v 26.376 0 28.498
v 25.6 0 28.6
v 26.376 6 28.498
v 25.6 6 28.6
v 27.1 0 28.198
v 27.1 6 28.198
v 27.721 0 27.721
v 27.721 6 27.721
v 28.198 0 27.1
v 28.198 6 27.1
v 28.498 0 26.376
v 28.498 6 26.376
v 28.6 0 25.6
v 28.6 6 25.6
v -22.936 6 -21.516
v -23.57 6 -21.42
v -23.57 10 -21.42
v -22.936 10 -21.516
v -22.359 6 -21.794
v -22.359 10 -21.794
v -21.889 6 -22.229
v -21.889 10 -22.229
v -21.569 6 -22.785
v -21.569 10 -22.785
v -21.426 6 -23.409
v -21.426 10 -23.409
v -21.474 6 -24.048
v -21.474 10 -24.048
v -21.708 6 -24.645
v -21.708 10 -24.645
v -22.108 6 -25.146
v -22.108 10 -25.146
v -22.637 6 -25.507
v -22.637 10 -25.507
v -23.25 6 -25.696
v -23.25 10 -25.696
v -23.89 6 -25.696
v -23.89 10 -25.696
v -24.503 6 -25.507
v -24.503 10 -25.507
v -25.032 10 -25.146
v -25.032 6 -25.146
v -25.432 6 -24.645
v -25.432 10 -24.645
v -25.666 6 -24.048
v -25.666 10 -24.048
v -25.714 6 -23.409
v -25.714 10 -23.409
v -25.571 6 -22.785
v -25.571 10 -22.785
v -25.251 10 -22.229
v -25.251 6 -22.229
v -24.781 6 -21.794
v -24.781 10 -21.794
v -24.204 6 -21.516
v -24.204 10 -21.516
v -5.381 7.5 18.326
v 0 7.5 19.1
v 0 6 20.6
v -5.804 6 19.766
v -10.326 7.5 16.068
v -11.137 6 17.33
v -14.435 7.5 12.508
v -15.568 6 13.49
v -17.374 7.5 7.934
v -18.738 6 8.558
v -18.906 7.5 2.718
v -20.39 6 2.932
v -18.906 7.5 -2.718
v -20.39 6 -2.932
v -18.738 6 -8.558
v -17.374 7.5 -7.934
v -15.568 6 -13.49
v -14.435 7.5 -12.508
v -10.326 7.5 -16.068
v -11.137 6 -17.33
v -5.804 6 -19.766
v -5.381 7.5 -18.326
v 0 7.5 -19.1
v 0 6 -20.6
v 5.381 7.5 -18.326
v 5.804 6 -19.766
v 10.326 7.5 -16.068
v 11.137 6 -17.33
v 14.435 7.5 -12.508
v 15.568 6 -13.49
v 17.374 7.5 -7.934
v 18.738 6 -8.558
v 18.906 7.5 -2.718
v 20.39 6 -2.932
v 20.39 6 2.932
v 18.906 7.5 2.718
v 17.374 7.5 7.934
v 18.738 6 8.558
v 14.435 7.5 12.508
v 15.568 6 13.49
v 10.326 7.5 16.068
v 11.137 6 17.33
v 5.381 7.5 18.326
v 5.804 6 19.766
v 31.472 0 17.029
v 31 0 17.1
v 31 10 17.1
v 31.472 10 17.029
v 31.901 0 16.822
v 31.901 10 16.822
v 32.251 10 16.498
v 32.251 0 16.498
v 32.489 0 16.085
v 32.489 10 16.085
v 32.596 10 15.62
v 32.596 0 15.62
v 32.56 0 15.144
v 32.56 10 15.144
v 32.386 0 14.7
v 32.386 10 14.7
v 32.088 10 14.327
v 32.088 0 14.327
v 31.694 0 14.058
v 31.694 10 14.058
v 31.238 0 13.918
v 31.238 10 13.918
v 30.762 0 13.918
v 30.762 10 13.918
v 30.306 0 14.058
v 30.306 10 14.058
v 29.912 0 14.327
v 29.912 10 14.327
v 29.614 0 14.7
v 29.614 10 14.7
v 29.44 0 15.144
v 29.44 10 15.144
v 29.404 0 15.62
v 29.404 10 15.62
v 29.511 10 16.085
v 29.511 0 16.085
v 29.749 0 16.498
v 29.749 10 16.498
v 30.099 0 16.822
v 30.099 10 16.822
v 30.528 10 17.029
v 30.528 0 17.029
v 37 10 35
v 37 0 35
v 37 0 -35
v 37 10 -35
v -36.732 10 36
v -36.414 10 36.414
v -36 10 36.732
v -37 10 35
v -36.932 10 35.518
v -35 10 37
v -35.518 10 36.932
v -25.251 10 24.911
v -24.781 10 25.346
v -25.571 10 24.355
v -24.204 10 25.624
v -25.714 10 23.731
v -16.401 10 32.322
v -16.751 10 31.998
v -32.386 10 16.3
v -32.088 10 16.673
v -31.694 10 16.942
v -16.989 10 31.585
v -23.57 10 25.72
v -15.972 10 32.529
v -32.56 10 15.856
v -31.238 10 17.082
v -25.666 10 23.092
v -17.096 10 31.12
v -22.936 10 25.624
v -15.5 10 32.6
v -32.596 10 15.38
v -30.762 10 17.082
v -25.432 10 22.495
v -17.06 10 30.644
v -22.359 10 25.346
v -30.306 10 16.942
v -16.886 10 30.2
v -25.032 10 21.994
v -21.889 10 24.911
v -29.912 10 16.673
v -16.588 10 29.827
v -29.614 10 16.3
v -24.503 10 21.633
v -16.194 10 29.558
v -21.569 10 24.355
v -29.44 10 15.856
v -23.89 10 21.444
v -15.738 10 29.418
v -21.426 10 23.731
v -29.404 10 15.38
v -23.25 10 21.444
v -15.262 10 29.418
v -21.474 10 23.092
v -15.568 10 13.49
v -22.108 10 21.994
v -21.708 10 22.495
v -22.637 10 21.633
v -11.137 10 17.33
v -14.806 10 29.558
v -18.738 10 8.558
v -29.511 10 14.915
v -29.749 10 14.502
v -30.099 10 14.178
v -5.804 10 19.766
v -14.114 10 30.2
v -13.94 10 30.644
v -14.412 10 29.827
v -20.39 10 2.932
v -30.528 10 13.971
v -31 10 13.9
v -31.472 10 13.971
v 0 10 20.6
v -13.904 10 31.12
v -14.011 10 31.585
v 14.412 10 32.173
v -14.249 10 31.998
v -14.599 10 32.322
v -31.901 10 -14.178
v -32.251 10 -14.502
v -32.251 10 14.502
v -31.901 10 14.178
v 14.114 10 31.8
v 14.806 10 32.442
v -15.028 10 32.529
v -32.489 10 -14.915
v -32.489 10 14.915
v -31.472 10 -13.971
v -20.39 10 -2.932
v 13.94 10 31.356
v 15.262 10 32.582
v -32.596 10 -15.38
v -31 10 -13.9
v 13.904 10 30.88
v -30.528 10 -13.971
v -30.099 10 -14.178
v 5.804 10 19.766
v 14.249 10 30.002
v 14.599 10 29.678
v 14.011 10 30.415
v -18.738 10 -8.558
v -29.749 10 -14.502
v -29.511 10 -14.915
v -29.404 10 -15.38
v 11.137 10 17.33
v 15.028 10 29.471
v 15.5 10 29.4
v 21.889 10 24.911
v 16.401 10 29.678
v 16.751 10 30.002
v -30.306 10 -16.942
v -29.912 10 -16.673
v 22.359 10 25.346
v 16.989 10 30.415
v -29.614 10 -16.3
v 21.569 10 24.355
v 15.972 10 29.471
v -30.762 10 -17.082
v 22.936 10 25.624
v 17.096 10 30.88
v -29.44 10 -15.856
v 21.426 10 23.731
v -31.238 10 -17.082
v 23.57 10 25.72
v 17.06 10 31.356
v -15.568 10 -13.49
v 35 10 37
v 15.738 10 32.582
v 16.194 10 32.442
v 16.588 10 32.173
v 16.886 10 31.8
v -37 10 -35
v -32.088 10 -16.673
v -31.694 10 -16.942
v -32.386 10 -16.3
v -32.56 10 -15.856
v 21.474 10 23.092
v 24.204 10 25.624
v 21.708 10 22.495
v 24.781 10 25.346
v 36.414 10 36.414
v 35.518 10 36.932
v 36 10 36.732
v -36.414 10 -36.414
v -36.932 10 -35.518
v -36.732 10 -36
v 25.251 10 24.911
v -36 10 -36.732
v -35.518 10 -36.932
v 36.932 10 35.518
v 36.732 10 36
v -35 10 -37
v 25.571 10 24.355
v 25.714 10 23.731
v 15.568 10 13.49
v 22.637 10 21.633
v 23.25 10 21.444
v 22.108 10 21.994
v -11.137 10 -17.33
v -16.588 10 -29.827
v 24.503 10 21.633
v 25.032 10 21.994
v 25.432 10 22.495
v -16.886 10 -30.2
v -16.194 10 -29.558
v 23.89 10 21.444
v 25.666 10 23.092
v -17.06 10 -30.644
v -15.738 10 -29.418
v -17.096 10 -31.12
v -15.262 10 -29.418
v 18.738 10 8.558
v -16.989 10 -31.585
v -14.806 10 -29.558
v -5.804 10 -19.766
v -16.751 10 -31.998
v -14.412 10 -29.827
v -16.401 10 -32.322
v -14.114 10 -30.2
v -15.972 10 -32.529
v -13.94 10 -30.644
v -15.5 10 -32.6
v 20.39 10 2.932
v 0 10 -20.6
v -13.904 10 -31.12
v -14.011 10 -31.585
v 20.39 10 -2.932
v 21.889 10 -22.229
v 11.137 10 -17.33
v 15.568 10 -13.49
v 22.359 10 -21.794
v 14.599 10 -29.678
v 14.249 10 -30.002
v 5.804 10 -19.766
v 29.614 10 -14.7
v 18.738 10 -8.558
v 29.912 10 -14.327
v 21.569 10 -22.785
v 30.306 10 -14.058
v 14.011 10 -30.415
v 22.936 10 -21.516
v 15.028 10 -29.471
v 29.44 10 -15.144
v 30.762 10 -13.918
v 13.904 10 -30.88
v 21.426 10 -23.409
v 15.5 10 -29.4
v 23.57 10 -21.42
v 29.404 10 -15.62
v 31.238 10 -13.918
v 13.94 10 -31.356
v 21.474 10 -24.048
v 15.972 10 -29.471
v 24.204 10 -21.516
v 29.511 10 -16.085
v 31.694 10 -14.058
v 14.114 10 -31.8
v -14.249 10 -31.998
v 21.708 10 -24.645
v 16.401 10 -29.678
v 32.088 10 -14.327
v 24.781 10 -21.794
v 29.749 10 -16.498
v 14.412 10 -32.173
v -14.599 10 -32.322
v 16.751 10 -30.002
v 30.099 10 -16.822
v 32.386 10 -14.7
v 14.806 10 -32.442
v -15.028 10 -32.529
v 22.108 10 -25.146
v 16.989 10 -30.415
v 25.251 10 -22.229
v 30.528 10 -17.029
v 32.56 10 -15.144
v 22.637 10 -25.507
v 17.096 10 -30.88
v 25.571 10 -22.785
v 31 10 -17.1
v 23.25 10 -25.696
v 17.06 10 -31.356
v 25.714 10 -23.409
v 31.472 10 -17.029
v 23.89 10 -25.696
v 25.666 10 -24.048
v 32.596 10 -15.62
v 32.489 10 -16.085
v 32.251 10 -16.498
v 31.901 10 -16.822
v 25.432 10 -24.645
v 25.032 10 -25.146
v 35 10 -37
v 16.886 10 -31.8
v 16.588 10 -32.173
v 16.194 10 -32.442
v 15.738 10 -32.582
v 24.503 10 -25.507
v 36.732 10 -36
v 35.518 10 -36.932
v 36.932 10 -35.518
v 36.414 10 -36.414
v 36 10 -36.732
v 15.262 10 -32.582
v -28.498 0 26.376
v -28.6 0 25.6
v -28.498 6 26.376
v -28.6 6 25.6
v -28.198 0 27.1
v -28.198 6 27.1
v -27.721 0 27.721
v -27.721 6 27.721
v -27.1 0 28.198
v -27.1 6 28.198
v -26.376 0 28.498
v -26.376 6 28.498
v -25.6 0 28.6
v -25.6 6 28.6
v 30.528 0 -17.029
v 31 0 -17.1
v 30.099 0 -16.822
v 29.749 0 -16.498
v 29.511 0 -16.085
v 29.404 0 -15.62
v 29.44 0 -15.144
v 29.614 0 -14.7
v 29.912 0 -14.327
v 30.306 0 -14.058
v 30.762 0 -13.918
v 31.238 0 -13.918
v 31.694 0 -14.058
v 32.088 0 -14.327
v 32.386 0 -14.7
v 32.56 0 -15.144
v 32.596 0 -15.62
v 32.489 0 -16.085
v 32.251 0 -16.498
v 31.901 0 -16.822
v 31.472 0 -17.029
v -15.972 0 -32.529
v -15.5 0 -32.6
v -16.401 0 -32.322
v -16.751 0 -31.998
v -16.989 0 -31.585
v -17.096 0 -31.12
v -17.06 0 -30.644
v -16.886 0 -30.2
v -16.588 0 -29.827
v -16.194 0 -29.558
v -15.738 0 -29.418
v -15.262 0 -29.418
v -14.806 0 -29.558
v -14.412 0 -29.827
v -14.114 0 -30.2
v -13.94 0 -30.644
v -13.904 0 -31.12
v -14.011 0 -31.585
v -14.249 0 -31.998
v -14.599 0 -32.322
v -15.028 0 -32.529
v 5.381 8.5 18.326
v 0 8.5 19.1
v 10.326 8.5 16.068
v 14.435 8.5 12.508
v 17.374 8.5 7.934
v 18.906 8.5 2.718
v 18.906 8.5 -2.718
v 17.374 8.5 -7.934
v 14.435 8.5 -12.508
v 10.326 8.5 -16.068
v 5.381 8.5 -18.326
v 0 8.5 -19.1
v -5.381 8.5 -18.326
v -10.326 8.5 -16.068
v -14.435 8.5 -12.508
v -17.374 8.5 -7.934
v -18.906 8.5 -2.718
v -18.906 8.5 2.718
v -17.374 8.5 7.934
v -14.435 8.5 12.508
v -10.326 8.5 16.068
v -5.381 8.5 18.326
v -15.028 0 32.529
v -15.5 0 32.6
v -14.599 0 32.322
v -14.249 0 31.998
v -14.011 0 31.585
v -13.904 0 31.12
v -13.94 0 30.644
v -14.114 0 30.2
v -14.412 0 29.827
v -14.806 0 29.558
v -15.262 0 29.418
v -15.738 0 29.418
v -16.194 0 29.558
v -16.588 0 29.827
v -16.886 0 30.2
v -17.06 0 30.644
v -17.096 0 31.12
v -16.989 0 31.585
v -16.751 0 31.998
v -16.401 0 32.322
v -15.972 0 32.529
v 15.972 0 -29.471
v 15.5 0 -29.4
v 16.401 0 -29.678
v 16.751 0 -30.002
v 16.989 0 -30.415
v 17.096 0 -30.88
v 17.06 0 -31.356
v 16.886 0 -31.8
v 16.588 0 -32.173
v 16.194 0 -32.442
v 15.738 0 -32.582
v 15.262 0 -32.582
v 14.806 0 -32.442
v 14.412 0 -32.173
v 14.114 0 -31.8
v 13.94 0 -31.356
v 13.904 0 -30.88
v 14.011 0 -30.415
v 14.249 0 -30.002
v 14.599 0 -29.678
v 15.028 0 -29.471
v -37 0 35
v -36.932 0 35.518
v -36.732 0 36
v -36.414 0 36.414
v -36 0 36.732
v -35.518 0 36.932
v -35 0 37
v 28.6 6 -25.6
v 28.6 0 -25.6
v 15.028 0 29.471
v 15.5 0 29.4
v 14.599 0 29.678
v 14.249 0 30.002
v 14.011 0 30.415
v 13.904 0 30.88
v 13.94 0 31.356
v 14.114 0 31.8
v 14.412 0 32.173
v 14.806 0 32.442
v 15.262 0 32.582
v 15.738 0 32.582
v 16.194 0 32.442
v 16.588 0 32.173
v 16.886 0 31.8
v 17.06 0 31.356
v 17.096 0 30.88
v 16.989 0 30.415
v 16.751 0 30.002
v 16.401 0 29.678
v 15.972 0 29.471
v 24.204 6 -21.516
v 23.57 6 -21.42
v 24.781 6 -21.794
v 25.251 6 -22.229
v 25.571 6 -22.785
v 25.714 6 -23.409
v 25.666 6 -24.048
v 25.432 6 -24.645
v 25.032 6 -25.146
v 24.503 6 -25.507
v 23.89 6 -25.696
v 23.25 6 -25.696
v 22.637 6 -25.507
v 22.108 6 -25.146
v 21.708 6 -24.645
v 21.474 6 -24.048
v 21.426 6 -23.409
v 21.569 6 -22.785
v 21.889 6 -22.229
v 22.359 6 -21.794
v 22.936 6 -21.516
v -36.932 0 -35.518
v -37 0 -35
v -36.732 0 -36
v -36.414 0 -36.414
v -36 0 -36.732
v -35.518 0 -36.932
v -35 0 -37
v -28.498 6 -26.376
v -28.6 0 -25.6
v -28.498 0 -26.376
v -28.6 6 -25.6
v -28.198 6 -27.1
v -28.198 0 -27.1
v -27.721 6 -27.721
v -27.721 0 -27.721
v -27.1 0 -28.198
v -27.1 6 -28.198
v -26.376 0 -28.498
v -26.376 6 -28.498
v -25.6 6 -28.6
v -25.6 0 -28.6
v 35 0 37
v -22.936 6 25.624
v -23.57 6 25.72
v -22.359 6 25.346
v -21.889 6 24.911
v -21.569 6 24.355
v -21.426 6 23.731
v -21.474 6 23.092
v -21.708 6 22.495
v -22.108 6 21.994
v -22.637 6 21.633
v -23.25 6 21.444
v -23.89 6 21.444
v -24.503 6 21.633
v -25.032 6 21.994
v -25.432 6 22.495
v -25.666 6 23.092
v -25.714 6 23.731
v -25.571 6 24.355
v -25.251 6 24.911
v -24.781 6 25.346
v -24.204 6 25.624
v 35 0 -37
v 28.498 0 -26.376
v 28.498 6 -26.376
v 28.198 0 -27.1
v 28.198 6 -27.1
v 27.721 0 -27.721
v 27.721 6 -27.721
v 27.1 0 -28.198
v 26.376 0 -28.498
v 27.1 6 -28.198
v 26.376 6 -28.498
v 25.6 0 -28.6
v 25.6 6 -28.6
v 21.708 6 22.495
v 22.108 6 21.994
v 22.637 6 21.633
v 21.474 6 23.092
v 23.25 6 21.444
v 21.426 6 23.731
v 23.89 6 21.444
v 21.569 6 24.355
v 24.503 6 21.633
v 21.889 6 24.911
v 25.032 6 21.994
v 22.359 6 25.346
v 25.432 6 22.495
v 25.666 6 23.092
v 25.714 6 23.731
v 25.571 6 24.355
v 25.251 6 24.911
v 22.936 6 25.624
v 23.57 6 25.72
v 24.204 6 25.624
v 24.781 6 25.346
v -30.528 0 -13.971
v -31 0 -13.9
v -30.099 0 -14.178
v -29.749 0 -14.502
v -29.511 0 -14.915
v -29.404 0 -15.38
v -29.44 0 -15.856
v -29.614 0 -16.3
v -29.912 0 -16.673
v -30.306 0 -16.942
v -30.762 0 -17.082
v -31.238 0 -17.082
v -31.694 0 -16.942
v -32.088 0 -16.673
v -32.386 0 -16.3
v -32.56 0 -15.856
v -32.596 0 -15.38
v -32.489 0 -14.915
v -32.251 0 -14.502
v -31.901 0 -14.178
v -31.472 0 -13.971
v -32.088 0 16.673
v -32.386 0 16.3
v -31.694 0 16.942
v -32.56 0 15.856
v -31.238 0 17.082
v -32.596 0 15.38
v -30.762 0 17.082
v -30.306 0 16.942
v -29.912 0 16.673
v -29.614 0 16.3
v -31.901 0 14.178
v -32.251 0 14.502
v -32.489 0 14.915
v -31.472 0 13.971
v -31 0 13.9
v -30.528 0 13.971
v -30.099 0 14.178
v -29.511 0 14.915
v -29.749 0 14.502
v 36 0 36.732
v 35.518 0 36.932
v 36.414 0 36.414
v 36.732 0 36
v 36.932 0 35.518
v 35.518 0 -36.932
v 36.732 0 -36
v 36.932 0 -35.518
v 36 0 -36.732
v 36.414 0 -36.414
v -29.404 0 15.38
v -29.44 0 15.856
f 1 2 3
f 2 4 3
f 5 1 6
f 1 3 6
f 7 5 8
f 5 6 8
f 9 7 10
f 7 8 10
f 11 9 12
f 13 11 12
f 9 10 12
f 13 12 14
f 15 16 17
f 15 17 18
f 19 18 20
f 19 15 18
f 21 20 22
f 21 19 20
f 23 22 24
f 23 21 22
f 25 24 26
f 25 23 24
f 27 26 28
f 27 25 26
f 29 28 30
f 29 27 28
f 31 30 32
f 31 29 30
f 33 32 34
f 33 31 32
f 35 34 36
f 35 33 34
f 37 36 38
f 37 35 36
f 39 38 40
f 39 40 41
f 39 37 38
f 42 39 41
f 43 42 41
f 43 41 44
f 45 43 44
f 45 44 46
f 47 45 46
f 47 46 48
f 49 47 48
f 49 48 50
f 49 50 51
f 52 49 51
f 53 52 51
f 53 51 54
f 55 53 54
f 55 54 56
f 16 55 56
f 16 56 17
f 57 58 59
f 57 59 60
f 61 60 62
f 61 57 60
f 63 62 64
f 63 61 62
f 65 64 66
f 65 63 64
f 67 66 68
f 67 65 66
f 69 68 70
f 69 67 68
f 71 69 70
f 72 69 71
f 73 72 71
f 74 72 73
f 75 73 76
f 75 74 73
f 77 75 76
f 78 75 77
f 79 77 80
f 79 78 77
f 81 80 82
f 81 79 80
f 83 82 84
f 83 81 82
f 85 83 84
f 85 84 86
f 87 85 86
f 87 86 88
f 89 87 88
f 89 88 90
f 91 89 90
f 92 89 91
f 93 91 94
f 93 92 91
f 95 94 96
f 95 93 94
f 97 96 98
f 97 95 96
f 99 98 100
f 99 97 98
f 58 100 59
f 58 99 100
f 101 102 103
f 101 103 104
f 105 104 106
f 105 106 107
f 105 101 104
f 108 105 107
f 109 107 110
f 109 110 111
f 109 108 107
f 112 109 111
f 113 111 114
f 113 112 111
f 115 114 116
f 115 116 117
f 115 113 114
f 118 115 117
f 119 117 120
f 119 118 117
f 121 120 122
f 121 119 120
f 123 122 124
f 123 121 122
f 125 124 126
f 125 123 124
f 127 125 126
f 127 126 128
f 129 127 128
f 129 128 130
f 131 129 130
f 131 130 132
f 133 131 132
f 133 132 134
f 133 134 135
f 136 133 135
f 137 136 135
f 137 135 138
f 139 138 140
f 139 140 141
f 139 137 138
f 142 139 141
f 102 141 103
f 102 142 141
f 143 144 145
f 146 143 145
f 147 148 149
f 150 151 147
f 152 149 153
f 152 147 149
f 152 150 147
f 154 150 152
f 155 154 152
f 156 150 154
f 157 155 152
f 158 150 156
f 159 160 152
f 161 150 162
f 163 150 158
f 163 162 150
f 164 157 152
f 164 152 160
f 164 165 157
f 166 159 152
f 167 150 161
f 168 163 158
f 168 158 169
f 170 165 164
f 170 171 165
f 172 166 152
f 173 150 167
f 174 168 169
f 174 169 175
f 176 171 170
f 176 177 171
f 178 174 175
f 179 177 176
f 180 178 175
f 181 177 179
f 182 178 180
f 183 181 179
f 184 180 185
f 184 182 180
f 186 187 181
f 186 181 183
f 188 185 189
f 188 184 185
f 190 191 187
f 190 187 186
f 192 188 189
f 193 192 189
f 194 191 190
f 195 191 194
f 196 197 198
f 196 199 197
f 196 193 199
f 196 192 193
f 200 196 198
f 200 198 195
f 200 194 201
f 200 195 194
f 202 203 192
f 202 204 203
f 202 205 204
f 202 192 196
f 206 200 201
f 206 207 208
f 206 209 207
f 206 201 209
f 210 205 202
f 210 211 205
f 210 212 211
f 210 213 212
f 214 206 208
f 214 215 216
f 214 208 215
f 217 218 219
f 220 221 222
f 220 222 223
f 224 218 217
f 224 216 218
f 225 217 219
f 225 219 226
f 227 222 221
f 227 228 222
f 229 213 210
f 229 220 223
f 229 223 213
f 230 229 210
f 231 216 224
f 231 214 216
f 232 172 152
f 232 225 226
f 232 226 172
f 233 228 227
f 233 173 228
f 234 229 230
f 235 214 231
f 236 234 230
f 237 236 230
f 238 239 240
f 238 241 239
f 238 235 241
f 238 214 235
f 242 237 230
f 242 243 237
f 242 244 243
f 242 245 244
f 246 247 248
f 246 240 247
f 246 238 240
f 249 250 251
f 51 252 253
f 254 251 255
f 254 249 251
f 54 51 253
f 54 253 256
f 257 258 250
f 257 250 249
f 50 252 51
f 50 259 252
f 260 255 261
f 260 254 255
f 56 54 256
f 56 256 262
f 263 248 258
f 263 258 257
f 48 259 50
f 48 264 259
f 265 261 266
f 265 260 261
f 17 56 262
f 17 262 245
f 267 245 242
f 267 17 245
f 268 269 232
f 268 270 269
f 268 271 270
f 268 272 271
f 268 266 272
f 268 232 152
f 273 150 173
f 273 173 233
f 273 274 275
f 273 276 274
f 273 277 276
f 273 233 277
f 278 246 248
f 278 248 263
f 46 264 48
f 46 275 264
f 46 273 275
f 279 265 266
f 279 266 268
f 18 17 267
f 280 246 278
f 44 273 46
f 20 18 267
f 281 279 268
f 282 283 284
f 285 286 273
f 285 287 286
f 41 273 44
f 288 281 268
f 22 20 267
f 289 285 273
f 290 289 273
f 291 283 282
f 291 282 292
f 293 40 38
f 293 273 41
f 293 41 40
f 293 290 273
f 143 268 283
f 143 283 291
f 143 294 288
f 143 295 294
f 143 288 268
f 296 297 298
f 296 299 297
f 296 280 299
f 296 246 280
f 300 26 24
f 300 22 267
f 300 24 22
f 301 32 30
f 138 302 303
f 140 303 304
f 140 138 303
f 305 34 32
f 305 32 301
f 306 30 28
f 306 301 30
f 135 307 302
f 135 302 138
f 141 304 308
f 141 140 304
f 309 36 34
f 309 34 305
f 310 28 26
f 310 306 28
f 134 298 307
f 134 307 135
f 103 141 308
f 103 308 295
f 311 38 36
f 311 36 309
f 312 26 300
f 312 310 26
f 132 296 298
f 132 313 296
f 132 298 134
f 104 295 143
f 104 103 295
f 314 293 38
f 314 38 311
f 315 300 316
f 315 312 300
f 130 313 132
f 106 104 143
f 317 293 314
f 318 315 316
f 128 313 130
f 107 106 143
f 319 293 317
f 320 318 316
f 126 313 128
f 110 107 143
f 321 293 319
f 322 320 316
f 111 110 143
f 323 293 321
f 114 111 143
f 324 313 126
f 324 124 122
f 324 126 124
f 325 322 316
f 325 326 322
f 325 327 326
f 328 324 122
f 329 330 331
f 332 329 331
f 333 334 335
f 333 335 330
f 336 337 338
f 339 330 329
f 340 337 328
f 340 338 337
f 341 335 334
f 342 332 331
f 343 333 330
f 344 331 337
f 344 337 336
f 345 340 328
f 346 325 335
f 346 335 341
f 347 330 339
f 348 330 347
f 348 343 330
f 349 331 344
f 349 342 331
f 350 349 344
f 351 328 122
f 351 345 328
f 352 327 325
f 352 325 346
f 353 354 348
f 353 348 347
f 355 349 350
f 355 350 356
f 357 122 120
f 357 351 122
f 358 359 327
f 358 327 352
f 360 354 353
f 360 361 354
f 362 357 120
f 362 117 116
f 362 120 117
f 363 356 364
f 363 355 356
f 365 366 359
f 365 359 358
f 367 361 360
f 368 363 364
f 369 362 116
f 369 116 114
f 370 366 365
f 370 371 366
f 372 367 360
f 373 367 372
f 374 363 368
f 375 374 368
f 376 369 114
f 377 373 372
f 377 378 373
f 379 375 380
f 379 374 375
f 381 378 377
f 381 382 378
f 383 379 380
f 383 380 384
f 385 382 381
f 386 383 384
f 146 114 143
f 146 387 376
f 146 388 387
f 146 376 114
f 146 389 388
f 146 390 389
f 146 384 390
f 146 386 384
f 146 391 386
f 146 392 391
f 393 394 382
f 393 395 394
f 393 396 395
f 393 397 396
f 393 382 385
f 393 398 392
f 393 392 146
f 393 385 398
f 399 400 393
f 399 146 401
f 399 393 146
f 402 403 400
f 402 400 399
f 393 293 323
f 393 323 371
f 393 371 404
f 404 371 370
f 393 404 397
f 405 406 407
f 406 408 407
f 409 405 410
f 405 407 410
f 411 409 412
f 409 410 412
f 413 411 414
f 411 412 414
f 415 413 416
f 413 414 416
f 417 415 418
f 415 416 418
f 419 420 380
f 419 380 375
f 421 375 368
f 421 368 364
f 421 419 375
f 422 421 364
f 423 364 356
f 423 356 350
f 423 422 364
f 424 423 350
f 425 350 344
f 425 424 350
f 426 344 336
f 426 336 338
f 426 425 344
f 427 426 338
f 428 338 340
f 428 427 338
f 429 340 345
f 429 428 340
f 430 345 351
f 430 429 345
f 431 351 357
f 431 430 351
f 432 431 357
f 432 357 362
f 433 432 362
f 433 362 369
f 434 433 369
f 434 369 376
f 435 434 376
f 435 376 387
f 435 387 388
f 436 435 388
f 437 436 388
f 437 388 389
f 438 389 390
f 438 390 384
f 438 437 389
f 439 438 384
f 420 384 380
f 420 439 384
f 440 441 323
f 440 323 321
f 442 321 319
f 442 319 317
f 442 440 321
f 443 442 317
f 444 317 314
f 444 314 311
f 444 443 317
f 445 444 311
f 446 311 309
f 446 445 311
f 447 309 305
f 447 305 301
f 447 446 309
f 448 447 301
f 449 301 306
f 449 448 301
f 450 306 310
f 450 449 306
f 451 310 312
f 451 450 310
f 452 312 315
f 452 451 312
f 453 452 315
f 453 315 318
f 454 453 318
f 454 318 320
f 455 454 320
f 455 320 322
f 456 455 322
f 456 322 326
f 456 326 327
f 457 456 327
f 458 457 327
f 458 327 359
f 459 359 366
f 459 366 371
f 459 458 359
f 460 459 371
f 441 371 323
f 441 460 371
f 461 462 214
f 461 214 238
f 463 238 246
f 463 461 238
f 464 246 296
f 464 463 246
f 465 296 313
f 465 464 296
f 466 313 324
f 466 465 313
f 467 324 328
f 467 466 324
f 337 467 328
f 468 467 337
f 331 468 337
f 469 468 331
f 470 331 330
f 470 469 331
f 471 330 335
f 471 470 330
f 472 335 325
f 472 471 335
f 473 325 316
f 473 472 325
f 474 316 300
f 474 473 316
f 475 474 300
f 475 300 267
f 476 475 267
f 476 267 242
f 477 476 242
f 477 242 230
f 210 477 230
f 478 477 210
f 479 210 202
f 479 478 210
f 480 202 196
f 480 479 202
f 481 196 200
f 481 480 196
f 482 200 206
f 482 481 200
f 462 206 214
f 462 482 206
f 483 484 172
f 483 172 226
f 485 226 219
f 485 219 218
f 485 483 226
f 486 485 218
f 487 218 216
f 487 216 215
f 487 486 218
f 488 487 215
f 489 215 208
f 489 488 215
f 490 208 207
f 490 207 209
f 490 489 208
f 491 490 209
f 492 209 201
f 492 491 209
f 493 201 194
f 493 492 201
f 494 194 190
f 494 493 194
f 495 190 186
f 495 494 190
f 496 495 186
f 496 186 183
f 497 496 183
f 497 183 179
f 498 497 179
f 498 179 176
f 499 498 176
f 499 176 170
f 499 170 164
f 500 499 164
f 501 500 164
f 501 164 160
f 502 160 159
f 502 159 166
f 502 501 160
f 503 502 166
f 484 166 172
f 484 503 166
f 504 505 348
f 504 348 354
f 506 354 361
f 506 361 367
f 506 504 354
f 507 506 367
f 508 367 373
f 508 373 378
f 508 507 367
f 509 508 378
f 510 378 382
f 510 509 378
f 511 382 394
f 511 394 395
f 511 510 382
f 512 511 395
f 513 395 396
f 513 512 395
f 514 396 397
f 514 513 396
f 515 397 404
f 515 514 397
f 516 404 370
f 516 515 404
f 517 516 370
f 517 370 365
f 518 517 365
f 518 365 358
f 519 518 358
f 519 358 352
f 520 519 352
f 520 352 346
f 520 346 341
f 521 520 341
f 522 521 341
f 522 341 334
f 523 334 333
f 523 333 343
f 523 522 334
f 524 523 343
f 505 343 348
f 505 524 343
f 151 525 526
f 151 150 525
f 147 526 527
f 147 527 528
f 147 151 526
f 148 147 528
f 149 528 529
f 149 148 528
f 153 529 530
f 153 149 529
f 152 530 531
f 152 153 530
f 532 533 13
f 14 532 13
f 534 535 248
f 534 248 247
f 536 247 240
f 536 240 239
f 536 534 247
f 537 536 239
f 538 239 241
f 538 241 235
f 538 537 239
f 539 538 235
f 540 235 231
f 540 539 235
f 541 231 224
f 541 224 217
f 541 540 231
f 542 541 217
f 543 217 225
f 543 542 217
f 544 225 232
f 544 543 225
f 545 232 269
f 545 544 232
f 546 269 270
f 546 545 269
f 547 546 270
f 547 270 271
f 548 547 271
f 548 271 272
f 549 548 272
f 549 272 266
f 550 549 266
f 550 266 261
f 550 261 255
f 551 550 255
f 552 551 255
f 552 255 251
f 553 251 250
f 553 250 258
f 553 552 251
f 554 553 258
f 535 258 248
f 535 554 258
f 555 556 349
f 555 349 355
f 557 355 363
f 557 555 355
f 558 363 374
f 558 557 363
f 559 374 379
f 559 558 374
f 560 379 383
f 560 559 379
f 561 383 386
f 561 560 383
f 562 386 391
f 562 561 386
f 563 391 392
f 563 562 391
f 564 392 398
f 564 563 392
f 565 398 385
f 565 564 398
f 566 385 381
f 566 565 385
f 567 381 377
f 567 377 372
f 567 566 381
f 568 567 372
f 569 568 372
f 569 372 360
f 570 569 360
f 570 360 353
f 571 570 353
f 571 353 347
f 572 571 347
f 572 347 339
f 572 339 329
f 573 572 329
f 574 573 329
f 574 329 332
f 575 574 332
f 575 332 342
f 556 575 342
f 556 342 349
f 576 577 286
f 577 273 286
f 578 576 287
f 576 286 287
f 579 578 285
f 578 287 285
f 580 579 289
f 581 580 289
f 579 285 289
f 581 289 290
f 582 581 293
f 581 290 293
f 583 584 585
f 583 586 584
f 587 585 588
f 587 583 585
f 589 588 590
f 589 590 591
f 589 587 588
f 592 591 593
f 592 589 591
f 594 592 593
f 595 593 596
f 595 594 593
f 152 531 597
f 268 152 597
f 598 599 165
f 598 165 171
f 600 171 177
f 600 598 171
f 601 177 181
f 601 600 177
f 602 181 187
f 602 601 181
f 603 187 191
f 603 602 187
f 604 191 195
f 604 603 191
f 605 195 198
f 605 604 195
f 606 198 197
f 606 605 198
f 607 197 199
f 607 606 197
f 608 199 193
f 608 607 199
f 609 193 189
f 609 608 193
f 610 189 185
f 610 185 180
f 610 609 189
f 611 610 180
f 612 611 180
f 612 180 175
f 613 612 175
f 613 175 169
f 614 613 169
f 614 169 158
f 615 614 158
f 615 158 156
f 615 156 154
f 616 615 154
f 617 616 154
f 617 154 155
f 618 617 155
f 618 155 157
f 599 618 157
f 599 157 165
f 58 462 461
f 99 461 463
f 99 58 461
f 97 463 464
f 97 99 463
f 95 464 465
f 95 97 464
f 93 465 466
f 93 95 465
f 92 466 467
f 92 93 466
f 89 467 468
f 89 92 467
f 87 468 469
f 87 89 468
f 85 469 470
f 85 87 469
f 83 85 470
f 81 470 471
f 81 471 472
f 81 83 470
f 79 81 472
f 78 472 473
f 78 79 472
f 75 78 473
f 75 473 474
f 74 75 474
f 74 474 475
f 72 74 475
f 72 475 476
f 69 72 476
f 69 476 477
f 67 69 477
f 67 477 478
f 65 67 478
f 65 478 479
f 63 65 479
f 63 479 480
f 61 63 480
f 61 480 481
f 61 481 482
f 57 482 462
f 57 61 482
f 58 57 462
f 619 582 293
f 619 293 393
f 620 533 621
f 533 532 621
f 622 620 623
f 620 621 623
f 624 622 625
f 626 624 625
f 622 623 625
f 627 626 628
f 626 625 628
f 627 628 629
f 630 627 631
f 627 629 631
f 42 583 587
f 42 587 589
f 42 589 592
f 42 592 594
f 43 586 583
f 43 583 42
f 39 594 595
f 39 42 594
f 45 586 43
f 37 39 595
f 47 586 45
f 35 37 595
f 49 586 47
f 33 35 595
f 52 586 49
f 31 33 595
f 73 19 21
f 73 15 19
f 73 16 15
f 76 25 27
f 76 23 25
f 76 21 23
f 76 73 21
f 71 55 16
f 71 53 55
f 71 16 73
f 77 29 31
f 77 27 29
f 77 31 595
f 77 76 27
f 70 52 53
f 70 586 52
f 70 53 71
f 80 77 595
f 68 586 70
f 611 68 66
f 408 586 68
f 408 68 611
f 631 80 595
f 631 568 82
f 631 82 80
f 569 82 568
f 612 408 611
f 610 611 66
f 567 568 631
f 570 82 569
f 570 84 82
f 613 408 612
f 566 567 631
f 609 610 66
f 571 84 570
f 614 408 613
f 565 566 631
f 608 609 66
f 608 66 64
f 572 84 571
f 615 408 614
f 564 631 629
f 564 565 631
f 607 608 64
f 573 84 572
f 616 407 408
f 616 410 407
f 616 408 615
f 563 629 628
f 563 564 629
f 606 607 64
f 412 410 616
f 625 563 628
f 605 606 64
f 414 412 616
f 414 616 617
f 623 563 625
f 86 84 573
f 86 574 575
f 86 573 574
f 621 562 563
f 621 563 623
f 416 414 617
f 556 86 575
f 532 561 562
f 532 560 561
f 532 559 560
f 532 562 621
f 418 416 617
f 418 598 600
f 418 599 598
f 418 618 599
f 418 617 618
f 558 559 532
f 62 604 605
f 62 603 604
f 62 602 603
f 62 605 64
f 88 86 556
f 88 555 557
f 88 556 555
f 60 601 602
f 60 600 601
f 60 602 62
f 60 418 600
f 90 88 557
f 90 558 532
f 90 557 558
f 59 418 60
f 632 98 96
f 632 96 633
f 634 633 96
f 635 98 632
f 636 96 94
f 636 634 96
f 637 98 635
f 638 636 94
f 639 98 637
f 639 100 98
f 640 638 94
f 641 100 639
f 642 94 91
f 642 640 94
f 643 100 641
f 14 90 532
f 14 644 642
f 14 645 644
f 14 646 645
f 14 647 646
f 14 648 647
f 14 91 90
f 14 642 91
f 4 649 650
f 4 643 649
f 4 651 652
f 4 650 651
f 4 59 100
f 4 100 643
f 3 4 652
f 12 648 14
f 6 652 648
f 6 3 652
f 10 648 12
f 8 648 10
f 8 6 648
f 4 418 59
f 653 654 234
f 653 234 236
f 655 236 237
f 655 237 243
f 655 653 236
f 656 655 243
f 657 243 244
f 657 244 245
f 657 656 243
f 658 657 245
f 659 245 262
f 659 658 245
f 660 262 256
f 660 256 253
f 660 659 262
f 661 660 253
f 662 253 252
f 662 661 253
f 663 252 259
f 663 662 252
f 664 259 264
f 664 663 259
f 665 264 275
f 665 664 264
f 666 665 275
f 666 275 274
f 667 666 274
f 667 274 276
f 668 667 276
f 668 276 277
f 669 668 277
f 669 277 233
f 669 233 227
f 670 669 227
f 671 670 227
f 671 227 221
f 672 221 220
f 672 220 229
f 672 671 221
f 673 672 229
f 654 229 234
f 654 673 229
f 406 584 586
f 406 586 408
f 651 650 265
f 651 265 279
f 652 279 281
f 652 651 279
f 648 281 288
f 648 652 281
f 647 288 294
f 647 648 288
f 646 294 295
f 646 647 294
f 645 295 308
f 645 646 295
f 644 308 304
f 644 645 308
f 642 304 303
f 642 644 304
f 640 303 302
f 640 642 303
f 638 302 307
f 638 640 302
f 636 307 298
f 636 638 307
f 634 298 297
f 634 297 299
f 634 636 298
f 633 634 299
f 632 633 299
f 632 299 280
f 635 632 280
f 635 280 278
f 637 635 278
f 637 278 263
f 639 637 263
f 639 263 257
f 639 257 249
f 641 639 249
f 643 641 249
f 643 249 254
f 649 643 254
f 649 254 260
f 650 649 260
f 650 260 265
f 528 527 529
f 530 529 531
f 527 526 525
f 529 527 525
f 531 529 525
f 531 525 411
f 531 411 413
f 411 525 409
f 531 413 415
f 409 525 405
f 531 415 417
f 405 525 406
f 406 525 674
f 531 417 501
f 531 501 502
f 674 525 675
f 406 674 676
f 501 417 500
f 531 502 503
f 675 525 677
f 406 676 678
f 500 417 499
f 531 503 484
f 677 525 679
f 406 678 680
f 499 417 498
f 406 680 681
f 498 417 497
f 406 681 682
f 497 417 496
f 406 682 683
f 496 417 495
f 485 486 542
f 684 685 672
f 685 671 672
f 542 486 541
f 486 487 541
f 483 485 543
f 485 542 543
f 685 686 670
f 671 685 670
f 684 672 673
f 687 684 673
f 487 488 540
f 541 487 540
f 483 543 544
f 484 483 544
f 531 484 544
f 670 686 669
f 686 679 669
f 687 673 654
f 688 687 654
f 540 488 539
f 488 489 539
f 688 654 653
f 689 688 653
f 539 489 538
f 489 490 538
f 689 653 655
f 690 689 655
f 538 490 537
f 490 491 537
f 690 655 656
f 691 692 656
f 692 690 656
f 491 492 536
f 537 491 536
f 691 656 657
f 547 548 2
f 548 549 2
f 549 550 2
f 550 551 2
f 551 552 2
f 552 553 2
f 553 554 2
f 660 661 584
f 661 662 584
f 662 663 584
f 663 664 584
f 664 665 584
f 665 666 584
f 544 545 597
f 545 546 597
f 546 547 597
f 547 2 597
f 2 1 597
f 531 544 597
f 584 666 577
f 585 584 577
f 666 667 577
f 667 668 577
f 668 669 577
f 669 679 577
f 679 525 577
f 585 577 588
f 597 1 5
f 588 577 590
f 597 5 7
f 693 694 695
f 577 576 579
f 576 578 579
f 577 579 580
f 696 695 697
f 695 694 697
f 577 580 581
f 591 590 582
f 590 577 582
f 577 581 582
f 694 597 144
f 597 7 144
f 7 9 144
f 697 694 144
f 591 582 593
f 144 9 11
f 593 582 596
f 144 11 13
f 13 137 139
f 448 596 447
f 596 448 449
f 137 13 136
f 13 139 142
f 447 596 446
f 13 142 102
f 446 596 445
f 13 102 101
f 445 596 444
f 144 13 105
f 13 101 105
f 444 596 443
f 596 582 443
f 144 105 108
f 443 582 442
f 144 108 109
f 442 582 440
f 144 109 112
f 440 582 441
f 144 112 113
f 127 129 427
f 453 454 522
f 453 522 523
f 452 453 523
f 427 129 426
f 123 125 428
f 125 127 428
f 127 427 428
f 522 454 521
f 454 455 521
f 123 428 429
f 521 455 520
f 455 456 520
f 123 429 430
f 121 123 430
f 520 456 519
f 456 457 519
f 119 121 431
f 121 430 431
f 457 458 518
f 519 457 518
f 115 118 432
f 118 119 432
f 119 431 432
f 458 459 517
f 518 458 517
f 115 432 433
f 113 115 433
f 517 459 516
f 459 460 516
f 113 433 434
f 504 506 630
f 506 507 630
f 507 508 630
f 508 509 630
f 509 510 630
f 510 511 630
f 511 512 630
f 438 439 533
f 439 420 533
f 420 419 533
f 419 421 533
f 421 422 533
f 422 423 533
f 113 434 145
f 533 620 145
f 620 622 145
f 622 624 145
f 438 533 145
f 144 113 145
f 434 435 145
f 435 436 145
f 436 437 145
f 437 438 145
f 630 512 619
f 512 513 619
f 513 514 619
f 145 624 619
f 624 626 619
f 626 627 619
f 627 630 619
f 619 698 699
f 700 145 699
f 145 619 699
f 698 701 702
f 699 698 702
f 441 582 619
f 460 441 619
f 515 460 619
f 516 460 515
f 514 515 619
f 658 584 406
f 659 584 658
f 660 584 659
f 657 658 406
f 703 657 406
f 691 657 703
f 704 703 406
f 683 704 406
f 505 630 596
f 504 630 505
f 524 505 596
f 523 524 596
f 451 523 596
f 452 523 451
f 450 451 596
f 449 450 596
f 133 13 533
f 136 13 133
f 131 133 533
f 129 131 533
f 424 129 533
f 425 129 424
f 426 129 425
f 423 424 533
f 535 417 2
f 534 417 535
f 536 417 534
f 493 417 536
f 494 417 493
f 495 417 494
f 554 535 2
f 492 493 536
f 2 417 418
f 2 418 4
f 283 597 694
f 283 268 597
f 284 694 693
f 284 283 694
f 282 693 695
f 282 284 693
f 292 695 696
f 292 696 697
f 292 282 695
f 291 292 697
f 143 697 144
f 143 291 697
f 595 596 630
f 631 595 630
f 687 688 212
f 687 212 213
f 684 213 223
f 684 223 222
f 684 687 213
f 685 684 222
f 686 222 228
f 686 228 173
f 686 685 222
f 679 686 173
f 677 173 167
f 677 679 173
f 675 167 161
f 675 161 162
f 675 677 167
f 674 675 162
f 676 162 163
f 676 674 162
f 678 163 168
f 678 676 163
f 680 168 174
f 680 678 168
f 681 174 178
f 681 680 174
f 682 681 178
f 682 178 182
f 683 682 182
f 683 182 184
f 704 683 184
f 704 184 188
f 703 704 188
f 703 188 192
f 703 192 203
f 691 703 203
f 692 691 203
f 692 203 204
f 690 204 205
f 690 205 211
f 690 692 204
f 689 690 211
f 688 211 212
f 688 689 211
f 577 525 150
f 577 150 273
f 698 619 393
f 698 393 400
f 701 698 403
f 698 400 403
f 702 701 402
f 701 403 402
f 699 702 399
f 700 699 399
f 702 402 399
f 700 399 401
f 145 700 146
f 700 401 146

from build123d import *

# Parameters (mm, degrees)
SKETCH1_W           = 74
SKETCH1_H           = 74
SKETCH1_R           = 2.15
SKETCH1_R_2         = 19.1
SKETCH1_R_3         = 1.6
BOSS_EXTRUDE1_DEPTH = 10
SKETCH2_W           = 57.2
SKETCH2_H           = 57.2
CUT_EXTRUDE1_DEPTH  = 6
FILLET1_R           = 3
CHAMFER1_SIZE       = 1.5
FILLET2_R           = 2


with BuildPart() as part:
    # Sketch1 → Boss-Extrude1 (new body)
    with BuildSketch(Plane(origin=(0, 0, 0), x_dir=(1, 0, 0), z_dir=(0, 1, 0))):
        Rectangle(SKETCH1_W, SKETCH1_H)
        with Locations(Location((23.57, 23.57, 0), (0, 0, 270))):
            Circle(SKETCH1_R, mode=Mode.SUBTRACT)
        with Locations(Location((-23.57, 23.57, 0), (0, 0, 270))):
            Circle(SKETCH1_R, mode=Mode.SUBTRACT)
        with Locations(Location((-23.57, -23.57, 0), (0, 0, 270))):
            Circle(SKETCH1_R, mode=Mode.SUBTRACT)
        with Locations(Location((23.57, -23.57, 0), (0, 0, 270))):
            Circle(SKETCH1_R, mode=Mode.SUBTRACT)
        with Locations(Location((0, 0, 0), (0, 0, 270))):
            Circle(SKETCH1_R_2, mode=Mode.SUBTRACT)
        with Locations(Location((15.5, 31, 0), (0, 0, 270))):
            Circle(SKETCH1_R_3, mode=Mode.SUBTRACT)
        with Locations(Location((-15.5, 31, 0), (0, 0, 90))):
            Circle(SKETCH1_R_3, mode=Mode.SUBTRACT)
        with Locations(Location((31, -15.5, 0), (0, 0, 270))):
            Circle(SKETCH1_R_3, mode=Mode.SUBTRACT)
        with Locations(Location((31, 15.5, 0), (0, 0, 90))):
            Circle(SKETCH1_R_3, mode=Mode.SUBTRACT)
        with Locations(Location((-15.5, -31, 0), (0, 0, 270))):
            Circle(SKETCH1_R_3, mode=Mode.SUBTRACT)
        with Locations(Location((15.5, -31, 0), (0, 0, 90))):
            Circle(SKETCH1_R_3, mode=Mode.SUBTRACT)
        with Locations(Location((-31, 15.5, 0), (0, 0, 270))):
            Circle(SKETCH1_R_3, mode=Mode.SUBTRACT)
        with Locations(Location((-31, -15.5, 0), (0, 0, 90))):
            Circle(SKETCH1_R_3, mode=Mode.SUBTRACT)
    extrude(amount=BOSS_EXTRUDE1_DEPTH)

    # Sketch2 → Cut-Extrude1 (cut)
    with BuildSketch(Plane.XZ):
        Rectangle(SKETCH2_W, SKETCH2_H)
    extrude(amount=-CUT_EXTRUDE1_DEPTH, mode=Mode.SUBTRACT)

    # Fillet1
    fillet1_edges = [part.edges().sort_by_distance(p)[0] for p in [
        (28.6, 3, 28.6),
        (28.6, 3, -28.6),
        (-28.6, 3, -28.6),
        (-28.6, 3, 28.6),
    ]]
    fillet(fillet1_edges, radius=FILLET1_R)

    # Chamfer1
    chamfer1_edges = [part.edges().sort_by_distance(p)[0] for p in [
        (0, 10, -19.1),
        (0, 6, -19.1),
    ]]
    chamfer(chamfer1_edges, length=CHAMFER1_SIZE)

    # Fillet2
    fillet2_edges = [part.edges().sort_by_distance(p)[0] for p in [
        (37, 5, 37),
        (-37, 5, 37),
        (-37, 5, -37),
        (37, 5, -37),
    ]]
    fillet(fillet2_edges, radius=FILLET2_R)


solid = part.part
